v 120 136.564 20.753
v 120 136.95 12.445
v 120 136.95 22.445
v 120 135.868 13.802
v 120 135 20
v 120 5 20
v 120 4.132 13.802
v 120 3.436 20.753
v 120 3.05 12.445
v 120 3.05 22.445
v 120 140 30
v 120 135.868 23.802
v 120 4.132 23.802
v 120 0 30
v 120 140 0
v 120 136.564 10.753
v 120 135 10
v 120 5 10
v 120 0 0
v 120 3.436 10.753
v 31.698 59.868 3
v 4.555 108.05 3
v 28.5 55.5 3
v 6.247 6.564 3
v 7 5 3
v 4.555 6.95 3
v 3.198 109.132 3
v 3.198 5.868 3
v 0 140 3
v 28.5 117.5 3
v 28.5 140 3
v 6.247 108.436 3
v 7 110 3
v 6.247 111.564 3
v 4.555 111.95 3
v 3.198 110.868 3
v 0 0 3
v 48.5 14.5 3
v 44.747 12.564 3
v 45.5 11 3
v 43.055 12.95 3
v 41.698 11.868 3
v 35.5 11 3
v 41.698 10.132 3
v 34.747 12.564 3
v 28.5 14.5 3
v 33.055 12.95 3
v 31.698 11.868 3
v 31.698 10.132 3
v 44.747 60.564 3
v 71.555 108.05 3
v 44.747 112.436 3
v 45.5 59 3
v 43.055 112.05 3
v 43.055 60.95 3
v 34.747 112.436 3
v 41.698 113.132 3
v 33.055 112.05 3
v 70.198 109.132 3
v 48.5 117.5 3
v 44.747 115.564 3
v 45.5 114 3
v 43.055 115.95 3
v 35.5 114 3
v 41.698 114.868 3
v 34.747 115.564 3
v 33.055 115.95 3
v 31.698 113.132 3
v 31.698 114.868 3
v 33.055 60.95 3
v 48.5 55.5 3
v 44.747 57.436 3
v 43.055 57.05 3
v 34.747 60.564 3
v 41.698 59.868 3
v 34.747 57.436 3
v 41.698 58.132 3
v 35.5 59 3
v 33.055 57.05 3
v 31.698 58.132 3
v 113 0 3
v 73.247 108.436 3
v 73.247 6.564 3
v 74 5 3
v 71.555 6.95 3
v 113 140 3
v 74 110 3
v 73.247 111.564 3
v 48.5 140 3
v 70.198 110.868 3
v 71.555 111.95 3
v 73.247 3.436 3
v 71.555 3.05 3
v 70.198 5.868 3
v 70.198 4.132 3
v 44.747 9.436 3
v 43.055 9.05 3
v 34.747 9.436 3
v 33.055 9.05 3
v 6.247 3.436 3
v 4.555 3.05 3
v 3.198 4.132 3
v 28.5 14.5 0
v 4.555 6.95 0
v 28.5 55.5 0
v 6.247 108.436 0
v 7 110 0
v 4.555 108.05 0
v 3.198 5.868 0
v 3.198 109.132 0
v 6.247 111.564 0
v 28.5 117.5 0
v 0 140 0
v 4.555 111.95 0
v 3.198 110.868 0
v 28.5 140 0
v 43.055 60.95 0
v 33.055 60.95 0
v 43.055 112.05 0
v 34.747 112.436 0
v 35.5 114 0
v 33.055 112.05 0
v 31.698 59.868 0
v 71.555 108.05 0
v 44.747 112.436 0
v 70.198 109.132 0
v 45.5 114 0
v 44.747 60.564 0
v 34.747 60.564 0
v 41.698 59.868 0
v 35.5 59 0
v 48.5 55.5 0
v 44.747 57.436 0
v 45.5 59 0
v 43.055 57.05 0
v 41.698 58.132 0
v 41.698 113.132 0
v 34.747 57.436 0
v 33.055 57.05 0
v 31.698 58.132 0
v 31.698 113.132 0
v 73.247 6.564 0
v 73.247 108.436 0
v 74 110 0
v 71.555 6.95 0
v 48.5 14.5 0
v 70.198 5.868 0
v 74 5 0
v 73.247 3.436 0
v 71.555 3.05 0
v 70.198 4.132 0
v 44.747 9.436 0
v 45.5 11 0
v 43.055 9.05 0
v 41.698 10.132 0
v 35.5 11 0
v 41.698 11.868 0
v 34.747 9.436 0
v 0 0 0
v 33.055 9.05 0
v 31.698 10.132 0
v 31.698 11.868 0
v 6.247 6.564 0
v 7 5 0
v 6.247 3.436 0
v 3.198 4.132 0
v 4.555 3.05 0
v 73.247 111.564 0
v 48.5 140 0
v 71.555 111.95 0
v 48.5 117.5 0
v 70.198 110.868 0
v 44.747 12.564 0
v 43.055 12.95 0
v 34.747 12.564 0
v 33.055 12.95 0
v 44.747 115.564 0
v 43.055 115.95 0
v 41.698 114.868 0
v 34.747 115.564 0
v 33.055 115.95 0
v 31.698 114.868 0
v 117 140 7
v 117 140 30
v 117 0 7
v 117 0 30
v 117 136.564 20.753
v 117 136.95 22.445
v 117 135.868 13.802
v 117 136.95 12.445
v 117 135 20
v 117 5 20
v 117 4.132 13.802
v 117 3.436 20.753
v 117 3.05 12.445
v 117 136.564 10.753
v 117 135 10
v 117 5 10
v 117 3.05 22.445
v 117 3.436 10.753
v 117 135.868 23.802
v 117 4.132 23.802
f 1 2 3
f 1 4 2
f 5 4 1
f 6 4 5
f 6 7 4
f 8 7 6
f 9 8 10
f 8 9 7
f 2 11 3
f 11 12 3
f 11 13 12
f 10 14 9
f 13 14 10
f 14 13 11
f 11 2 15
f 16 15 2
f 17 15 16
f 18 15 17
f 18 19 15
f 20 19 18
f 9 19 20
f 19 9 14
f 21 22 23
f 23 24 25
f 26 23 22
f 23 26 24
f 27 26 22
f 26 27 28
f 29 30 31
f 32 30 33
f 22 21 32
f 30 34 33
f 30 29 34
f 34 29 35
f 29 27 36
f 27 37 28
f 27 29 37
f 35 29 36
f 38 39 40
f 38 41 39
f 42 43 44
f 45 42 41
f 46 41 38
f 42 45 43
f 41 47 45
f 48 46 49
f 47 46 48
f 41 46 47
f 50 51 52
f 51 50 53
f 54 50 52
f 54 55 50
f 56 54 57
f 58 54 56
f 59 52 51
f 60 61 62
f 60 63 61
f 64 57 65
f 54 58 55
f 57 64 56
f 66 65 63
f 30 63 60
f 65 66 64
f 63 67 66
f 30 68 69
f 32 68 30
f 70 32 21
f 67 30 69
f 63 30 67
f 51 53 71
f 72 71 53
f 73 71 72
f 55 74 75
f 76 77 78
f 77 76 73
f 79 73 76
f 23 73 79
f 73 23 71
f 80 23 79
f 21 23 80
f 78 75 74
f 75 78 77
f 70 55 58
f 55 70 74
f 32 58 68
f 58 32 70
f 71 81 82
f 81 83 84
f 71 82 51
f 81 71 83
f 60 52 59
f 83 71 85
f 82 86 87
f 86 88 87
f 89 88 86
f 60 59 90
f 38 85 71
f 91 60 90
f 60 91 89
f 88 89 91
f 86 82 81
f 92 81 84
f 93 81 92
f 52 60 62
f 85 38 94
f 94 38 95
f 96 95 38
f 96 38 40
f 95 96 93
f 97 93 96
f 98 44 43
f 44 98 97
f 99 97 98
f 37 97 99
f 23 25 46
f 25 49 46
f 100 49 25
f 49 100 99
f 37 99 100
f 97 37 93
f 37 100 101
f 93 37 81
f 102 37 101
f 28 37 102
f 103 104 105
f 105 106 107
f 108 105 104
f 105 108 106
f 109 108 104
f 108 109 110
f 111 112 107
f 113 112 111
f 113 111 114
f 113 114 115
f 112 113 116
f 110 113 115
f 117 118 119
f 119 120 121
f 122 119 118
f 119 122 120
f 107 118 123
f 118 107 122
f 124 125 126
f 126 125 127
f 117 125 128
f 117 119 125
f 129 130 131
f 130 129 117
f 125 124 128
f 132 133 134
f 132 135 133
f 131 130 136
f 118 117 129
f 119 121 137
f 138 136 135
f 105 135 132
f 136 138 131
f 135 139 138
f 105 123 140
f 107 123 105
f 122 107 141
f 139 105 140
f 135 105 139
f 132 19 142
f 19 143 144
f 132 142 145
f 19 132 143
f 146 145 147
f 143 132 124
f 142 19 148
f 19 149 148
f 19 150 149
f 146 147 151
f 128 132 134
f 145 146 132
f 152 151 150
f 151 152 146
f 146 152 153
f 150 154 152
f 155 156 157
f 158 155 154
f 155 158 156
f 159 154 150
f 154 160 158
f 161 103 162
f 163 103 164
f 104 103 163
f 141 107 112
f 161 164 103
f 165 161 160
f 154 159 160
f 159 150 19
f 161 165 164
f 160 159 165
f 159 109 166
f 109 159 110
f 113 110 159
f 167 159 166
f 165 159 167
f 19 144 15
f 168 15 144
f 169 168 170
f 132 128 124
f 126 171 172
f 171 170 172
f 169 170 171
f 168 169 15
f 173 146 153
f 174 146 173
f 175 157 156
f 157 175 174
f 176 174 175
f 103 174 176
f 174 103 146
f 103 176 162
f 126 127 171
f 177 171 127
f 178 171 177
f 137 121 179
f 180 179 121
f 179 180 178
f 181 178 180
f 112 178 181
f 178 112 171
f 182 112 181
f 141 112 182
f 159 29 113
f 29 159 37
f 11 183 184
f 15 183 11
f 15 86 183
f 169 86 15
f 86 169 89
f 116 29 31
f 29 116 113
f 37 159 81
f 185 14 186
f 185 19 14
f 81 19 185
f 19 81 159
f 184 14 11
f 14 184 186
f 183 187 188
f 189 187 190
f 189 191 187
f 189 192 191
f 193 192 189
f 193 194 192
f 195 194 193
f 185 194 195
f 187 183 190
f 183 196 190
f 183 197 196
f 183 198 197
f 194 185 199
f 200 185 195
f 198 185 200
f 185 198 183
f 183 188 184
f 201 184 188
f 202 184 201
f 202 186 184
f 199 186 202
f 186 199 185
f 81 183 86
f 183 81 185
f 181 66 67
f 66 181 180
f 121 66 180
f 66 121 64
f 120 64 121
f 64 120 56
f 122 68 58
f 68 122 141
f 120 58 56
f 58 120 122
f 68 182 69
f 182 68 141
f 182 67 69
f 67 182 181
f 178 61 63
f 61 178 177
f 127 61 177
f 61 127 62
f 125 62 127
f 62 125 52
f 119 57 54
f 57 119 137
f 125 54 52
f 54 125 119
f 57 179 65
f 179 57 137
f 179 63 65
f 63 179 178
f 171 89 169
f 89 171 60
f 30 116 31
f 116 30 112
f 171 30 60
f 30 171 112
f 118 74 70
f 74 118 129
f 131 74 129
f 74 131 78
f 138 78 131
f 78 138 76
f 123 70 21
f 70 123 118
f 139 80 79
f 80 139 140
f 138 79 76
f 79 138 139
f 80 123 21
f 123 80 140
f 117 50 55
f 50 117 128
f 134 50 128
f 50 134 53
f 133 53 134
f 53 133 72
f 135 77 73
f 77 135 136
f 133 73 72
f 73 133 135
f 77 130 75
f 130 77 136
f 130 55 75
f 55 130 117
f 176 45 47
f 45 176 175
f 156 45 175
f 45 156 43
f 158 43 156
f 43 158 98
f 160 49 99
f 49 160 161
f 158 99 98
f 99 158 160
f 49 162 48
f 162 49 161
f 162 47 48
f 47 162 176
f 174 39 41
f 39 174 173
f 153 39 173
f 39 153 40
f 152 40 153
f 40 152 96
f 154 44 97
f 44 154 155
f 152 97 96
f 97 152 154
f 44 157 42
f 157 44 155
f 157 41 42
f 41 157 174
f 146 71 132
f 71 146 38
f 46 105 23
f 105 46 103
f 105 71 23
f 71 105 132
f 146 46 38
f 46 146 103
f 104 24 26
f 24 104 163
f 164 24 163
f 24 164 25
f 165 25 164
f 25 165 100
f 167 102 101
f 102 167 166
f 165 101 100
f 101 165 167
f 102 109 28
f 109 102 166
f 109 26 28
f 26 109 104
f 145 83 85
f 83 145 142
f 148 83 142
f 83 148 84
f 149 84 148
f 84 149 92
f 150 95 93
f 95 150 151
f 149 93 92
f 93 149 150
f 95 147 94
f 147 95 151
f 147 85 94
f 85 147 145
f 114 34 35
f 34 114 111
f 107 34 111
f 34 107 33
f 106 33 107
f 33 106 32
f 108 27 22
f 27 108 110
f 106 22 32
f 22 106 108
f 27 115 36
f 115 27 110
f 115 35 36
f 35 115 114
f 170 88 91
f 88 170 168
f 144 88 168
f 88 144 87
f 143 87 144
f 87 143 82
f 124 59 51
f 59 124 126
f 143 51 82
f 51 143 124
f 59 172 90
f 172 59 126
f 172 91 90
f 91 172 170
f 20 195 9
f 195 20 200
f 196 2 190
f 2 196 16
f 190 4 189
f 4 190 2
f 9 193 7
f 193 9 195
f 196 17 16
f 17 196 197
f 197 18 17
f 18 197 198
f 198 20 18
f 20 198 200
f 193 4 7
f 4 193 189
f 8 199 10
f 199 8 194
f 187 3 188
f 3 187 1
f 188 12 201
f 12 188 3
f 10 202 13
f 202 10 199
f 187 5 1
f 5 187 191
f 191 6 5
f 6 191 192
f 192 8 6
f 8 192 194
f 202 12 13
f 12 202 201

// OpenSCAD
module servo() {
	union() {
		translate([5,40+4,6]) cylinder(10,4/2,4/2);
		translate([15,40+4,6]) cylinder(10,4/2,4/2);
		translate([5,-4,6]) cylinder(10,4/2,4/2);
		translate([15,-4,6]) cylinder(10,4/2,4/2);
		translate([0,-1/2,0])cube([20,41,20]);
		
	}
}

difference() {

// doska s bocnym uchytom	
union() {
	cube([120 , 140, 3]);
	translate([120-3,0,0]) {
		cube([3,140, 30]);
	}
	translate([120-7,0,3]) rotate(45, [0,1,0]){
		cube([3,140, 6]);
	}
}


translate([5,   5,-2.5]) cylinder(10, 4/2, 4/2);
translate([5+67,5,-2.5]) cylinder(10, 4/2, 4/2);
translate([5,   5+105,-2.5]) cylinder(10, 4/2, 4/2);
translate([5+67,5+105,-2.5]) cylinder(10, 4/2, 4/2);
/*
translate([120-6,5+13-10,10]) hull() {
	rotate(90, [0, 1,0]) cylinder(15, 4/2, 4/2);
	translate([0,0,15]) rotate(90, [0, 1,0]) cylinder(15, 4/2, 4/2);
}
translate([120-6,5+13+10,10]) hull() {
	rotate(90, [0, 1,0]) cylinder(15, 4/2, 4/2);
	translate([0,0,15]) rotate(90, [0, 1,0]) cylinder(15, 4/2, 4/2);
}

translate([120-6,5+13-10+110-36,10]) hull() {
	rotate(90, [0, 1,0]) cylinder(15, 4/2, 4/2);
	translate([0,0,15]) rotate(90, [0, 1,0]) cylinder(15, 4/2, 4/2);
}
translate([120-6,5+13+10+110-36,10]) hull() {
	rotate(90, [0, 1,0]) cylinder(15, 4/2, 4/2);
	translate([0,0,15]) rotate(90, [0, 1,0]) cylinder(15, 4/2, 4/2);
}
*/

translate([120-6,5,12]) hull() {
	rotate(90, [0, 1,0]) cylinder(15, 4/2, 4/2);
	translate([0,130,0]) rotate(90, [0, 1, 0]) cylinder(15, 4/2, 4/2);
}
translate([120-6,5,22]) hull() {
	rotate(90, [0, 1,0]) cylinder(15, 4/2, 4/2);
	translate([0,130,0]) rotate(90, [0, 1, 0]) cylinder(15, 4/2, 4/2);
}

translate([67/2-5,105+5+18-10,-10]) servo();
translate([67/2-5,5+20-10,-10]) servo();
}
